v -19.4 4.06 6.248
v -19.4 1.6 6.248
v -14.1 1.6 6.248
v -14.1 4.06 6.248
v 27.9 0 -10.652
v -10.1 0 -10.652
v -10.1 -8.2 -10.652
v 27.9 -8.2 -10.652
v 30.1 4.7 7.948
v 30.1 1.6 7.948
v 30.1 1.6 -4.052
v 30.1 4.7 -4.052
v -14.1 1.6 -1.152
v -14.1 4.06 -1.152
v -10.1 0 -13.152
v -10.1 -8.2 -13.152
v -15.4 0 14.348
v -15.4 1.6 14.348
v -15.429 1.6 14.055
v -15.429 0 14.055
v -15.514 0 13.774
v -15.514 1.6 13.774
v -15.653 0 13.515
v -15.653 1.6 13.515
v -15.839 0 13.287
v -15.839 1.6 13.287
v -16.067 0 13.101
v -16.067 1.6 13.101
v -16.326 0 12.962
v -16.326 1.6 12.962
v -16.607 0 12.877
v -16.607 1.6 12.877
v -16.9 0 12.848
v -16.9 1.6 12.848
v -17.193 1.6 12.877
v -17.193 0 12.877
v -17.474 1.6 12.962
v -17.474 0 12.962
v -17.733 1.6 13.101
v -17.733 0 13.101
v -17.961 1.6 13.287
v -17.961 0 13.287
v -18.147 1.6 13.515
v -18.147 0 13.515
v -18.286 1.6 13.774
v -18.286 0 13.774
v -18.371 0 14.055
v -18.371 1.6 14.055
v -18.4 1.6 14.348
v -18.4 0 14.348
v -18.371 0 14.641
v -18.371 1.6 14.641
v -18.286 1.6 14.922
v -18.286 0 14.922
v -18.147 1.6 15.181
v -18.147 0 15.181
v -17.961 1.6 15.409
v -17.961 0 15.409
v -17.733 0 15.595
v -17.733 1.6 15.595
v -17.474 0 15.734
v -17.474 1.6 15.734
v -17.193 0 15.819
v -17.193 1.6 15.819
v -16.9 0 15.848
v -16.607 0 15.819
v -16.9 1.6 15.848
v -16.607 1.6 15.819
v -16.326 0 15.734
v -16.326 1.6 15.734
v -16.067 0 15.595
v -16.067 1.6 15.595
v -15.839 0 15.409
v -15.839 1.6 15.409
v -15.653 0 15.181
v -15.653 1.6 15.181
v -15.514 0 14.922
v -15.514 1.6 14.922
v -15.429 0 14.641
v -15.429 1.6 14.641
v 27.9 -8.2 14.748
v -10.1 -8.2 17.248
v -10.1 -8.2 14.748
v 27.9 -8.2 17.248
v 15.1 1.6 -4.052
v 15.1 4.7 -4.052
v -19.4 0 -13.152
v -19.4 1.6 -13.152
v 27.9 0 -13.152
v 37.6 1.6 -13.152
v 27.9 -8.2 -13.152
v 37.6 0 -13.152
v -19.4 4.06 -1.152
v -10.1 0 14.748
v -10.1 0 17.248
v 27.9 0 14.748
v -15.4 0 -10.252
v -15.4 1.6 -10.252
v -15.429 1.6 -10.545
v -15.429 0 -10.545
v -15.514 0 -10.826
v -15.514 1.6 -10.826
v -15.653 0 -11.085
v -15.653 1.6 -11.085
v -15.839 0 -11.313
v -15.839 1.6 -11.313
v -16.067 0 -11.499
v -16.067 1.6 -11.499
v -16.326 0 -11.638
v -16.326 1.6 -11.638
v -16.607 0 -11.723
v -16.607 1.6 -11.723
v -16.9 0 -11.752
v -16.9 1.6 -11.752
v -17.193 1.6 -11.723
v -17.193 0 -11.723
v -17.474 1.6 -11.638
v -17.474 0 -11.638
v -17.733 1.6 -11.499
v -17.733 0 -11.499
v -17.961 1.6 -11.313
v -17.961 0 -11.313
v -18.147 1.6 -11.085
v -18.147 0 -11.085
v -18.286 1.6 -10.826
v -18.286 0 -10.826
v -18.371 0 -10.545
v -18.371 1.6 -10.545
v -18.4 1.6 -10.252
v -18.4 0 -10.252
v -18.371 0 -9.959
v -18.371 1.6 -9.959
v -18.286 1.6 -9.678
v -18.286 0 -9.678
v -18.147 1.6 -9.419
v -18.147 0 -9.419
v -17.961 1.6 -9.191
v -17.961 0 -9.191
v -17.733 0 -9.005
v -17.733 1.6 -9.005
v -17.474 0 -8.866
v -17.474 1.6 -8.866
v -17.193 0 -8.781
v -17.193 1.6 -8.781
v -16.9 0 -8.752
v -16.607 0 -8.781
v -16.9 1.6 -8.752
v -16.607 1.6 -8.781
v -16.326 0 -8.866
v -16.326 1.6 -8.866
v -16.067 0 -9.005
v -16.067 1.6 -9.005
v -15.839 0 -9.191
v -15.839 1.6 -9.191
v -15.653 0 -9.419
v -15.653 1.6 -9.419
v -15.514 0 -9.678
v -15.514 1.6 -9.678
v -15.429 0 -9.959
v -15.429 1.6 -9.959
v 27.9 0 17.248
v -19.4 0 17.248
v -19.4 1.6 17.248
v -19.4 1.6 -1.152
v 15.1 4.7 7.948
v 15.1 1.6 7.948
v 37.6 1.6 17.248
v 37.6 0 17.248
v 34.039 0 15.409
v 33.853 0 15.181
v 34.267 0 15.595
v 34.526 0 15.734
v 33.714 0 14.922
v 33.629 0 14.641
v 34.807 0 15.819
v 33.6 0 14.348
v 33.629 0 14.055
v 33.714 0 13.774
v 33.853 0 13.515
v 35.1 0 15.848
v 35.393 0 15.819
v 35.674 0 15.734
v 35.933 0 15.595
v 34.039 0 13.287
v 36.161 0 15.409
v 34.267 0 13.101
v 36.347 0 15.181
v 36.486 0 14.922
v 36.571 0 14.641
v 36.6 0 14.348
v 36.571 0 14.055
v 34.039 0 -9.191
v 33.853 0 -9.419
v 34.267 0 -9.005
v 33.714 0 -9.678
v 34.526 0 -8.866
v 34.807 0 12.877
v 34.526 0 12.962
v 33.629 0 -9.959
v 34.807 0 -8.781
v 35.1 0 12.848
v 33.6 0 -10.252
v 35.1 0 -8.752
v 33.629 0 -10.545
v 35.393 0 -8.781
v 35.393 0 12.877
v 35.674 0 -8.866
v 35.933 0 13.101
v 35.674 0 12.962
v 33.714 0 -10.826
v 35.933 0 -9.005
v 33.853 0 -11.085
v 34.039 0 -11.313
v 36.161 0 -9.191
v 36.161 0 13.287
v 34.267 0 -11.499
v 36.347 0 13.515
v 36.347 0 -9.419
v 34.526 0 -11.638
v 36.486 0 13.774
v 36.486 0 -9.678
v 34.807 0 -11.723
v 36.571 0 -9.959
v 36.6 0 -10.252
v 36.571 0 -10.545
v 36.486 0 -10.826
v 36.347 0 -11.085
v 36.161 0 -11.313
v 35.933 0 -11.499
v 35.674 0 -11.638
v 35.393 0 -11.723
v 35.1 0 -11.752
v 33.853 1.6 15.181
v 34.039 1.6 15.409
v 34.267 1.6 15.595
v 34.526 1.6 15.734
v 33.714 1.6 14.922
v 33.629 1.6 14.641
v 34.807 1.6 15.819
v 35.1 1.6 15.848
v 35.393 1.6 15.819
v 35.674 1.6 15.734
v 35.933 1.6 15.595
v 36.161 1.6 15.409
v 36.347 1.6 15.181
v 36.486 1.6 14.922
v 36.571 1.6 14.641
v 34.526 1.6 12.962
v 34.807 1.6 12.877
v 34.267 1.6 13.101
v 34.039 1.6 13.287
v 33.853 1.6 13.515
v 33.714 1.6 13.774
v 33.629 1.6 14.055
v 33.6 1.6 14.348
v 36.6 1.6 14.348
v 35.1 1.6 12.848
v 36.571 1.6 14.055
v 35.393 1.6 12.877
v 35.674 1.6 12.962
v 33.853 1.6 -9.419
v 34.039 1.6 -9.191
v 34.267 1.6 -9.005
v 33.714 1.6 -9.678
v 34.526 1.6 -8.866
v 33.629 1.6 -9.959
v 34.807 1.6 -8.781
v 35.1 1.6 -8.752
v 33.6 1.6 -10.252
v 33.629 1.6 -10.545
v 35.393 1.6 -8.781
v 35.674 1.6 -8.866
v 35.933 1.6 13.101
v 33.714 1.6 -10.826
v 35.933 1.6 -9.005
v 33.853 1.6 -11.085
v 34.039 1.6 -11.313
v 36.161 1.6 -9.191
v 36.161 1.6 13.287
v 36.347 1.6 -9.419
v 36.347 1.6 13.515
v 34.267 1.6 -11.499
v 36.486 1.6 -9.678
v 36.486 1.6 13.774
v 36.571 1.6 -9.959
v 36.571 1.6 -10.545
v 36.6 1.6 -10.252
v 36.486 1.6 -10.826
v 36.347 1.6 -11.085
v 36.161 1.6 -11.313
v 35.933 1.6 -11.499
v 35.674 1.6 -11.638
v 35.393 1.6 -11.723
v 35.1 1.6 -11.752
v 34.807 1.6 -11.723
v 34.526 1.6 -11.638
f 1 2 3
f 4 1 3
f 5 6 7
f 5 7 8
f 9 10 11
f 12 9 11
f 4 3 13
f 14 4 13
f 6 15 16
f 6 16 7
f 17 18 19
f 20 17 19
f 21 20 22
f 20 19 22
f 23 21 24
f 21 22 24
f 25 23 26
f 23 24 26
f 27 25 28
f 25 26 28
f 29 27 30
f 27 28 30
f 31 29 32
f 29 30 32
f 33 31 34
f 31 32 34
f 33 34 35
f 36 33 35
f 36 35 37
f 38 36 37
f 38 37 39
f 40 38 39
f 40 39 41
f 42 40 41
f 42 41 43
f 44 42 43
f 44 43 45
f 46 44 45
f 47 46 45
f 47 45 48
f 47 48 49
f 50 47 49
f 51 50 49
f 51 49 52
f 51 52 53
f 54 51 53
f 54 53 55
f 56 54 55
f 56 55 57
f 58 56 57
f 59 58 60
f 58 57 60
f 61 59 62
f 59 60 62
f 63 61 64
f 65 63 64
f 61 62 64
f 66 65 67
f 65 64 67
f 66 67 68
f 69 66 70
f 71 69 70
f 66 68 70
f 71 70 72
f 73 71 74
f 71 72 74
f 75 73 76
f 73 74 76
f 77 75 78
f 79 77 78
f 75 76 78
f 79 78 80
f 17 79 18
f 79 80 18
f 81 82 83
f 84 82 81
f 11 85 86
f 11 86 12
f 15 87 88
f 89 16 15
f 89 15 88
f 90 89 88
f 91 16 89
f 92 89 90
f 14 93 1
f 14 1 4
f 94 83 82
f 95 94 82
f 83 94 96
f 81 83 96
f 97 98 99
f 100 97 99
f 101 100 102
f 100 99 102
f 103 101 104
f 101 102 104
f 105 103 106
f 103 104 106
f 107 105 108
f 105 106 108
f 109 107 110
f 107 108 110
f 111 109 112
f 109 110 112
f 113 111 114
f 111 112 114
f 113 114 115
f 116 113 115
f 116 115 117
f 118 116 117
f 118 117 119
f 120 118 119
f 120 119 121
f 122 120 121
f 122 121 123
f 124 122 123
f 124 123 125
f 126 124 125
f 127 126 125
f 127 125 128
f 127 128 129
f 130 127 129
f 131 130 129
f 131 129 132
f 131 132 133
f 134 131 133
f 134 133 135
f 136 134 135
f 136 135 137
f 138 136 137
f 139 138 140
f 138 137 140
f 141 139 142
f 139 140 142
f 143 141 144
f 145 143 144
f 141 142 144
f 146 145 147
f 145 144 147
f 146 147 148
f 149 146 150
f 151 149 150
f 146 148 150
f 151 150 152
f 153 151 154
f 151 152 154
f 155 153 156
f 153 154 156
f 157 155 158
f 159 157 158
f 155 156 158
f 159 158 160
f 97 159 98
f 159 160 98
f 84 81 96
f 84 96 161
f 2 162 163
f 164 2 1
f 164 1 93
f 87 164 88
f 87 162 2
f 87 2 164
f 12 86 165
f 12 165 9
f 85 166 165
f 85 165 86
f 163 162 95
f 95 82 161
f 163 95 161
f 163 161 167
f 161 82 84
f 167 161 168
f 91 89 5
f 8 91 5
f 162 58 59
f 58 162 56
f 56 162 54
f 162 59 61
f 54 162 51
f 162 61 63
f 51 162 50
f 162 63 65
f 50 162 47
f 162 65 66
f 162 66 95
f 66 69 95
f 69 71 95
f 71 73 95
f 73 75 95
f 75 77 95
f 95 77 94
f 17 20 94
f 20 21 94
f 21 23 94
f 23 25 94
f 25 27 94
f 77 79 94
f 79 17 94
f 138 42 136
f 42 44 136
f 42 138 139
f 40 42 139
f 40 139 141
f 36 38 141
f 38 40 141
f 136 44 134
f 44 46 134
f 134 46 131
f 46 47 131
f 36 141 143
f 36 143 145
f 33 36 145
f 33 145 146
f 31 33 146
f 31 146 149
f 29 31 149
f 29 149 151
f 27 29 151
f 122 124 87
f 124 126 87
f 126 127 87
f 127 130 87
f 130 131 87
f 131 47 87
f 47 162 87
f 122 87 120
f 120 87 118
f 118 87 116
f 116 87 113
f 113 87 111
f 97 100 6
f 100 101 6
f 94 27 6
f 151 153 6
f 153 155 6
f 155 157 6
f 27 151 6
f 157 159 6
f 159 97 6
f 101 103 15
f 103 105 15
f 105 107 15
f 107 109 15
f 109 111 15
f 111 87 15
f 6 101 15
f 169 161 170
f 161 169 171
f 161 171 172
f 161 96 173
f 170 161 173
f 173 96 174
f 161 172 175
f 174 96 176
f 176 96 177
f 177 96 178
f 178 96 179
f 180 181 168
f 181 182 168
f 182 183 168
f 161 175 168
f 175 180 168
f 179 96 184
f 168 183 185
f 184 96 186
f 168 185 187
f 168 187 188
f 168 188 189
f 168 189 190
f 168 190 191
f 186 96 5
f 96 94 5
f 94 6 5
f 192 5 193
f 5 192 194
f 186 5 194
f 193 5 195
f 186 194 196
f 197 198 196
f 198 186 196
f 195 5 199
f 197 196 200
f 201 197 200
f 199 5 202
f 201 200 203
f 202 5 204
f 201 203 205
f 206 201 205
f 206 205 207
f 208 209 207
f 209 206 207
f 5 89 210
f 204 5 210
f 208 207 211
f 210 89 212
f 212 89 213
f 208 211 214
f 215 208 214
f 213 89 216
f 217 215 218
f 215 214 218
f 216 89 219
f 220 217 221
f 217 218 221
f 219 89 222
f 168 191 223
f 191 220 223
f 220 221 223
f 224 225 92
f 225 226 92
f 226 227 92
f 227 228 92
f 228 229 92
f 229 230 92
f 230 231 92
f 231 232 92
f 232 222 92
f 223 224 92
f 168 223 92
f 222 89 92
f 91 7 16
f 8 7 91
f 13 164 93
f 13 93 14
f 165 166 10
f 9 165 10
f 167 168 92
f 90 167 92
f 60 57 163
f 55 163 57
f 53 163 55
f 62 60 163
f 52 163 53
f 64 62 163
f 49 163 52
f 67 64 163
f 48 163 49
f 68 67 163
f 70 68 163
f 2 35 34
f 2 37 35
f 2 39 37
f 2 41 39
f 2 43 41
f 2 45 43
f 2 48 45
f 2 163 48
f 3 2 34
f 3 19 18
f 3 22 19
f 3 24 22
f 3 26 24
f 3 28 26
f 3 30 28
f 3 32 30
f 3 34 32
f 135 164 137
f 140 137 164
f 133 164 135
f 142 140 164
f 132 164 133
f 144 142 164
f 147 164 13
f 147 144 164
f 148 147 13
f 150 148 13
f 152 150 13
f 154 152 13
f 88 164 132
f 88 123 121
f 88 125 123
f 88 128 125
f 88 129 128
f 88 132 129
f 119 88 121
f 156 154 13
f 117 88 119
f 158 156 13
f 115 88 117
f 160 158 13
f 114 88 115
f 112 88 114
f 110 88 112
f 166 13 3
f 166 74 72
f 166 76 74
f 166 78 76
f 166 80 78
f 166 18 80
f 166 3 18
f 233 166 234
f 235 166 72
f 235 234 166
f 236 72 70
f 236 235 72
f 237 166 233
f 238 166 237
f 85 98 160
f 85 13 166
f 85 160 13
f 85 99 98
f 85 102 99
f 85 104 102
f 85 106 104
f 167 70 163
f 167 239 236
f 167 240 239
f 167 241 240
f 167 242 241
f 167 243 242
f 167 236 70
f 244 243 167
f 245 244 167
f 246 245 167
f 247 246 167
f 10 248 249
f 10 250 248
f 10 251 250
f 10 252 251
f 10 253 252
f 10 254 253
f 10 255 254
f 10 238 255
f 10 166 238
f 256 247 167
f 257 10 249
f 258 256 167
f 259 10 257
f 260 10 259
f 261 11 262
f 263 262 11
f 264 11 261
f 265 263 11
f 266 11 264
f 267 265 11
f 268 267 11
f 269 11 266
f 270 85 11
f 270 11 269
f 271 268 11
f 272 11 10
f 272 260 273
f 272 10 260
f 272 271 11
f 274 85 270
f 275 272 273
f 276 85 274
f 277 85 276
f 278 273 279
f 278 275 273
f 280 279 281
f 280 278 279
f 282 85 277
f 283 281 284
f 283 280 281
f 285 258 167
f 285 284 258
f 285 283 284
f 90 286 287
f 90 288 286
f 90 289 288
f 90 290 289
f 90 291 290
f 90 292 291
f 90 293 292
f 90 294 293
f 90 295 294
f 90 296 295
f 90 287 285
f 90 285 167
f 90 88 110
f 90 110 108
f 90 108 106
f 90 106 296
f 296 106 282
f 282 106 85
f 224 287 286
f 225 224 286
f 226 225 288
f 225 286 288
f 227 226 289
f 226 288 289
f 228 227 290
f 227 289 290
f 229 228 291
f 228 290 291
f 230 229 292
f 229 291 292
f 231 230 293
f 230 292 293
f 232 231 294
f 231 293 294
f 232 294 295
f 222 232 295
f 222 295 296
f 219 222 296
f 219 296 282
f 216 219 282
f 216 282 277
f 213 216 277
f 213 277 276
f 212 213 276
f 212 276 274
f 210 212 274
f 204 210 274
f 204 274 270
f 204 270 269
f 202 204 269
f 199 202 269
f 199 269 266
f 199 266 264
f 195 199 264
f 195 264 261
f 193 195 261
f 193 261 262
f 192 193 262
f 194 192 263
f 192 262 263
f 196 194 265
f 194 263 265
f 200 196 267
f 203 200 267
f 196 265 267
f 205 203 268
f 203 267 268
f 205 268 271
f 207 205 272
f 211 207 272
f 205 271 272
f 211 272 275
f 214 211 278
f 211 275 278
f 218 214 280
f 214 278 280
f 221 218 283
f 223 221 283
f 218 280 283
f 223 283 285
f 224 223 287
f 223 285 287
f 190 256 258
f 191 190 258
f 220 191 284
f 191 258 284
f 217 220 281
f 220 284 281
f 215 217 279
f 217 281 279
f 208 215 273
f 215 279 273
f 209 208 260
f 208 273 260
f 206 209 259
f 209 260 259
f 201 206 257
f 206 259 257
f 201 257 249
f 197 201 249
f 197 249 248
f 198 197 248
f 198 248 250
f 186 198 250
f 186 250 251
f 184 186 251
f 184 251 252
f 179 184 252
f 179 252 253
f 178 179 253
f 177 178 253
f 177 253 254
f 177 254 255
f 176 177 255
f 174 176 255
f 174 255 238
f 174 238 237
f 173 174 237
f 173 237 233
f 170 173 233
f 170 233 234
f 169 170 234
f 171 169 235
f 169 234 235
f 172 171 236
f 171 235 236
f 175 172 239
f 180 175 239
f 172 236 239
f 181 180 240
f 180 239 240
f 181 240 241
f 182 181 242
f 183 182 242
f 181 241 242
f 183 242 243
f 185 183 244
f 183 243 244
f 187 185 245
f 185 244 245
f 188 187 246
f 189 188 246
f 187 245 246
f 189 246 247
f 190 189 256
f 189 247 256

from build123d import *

# Parameters (mm, degrees)
SKETCH_1_W          = 57
SKETCH_1_H          = 30.4
EXTRUDE_1_DEPTH     = 1.6
SKETCH_2_W          = 15
SKETCH_2_H          = 12
EXTRUDE_2_DEPTH     = 3.1
SKETCH_3_W          = 5.3
SKETCH_3_H          = 7.4
EXTRUDE_3_DEPTH     = 2.46
SKETCH_4_R          = 1.5
CUT_EXTRUDE_1_DEPTH = 2.6
SKETCH_5_W          = 38
SKETCH_5_H          = 2.5
EXTRUDE_4_DEPTH     = 8.2


with BuildPart() as part:
    # 草图1 → 凸台-拉伸1 (new body)
    with BuildSketch(Plane(origin=(0, 0, 0), x_dir=(1, 0, 0), z_dir=(0, 1, 0))):
        with Locations((9.099869202, -2.04798995)):
            Rectangle(SKETCH_1_W, SKETCH_1_H)
    extrude(amount=EXTRUDE_1_DEPTH)

    # 草图2 → 凸台-拉伸2 (add)
    with BuildSketch(Plane(origin=(0, 1.6, 0), x_dir=(1, 0, 0), z_dir=(0, 1, 0))):
        with Locations((22.599869202, -1.94798995)):
            Rectangle(SKETCH_2_W, SKETCH_2_H)
    extrude(amount=EXTRUDE_2_DEPTH)

    # 草图3 → 凸台-拉伸3 (add)
    with BuildSketch(Plane(origin=(0, 1.6, 0), x_dir=(1, 0, 0), z_dir=(0, 1, 0))):
        with Locations((-16.750130798, -2.54798995)):
            Rectangle(SKETCH_3_W, SKETCH_3_H)
    extrude(amount=EXTRUDE_3_DEPTH)

    # 草图4 → 切除-拉伸1 (cut, through all)
    with BuildSketch(Plane(origin=(0, 1.6, 0), x_dir=(1, 0, 0), z_dir=(0, 1, 0))):
        with Locations((-16.900130798, 10.25201005)):
            Circle(SKETCH_4_R)
        with Locations((-16.900130798, -14.34798995)):
            Circle(SKETCH_4_R)
        with Locations((35.099869202, -14.34798995)):
            Circle(SKETCH_4_R)
        with Locations((35.099869202, 10.25201005)):
            Circle(SKETCH_4_R)
    extrude(amount=-CUT_EXTRUDE_1_DEPTH, mode=Mode.SUBTRACT)

    # 草图5 → 凸台-拉伸4 (add)
    with BuildSketch(Plane.XZ):
        with Locations((8.899869202, 15.99798995)):
            Rectangle(SKETCH_5_W, SKETCH_5_H)
        with Locations((8.899869202, -11.90201005)):
            Rectangle(SKETCH_5_W, SKETCH_5_H)
    extrude(amount=EXTRUDE_4_DEPTH)


solid = part.part
